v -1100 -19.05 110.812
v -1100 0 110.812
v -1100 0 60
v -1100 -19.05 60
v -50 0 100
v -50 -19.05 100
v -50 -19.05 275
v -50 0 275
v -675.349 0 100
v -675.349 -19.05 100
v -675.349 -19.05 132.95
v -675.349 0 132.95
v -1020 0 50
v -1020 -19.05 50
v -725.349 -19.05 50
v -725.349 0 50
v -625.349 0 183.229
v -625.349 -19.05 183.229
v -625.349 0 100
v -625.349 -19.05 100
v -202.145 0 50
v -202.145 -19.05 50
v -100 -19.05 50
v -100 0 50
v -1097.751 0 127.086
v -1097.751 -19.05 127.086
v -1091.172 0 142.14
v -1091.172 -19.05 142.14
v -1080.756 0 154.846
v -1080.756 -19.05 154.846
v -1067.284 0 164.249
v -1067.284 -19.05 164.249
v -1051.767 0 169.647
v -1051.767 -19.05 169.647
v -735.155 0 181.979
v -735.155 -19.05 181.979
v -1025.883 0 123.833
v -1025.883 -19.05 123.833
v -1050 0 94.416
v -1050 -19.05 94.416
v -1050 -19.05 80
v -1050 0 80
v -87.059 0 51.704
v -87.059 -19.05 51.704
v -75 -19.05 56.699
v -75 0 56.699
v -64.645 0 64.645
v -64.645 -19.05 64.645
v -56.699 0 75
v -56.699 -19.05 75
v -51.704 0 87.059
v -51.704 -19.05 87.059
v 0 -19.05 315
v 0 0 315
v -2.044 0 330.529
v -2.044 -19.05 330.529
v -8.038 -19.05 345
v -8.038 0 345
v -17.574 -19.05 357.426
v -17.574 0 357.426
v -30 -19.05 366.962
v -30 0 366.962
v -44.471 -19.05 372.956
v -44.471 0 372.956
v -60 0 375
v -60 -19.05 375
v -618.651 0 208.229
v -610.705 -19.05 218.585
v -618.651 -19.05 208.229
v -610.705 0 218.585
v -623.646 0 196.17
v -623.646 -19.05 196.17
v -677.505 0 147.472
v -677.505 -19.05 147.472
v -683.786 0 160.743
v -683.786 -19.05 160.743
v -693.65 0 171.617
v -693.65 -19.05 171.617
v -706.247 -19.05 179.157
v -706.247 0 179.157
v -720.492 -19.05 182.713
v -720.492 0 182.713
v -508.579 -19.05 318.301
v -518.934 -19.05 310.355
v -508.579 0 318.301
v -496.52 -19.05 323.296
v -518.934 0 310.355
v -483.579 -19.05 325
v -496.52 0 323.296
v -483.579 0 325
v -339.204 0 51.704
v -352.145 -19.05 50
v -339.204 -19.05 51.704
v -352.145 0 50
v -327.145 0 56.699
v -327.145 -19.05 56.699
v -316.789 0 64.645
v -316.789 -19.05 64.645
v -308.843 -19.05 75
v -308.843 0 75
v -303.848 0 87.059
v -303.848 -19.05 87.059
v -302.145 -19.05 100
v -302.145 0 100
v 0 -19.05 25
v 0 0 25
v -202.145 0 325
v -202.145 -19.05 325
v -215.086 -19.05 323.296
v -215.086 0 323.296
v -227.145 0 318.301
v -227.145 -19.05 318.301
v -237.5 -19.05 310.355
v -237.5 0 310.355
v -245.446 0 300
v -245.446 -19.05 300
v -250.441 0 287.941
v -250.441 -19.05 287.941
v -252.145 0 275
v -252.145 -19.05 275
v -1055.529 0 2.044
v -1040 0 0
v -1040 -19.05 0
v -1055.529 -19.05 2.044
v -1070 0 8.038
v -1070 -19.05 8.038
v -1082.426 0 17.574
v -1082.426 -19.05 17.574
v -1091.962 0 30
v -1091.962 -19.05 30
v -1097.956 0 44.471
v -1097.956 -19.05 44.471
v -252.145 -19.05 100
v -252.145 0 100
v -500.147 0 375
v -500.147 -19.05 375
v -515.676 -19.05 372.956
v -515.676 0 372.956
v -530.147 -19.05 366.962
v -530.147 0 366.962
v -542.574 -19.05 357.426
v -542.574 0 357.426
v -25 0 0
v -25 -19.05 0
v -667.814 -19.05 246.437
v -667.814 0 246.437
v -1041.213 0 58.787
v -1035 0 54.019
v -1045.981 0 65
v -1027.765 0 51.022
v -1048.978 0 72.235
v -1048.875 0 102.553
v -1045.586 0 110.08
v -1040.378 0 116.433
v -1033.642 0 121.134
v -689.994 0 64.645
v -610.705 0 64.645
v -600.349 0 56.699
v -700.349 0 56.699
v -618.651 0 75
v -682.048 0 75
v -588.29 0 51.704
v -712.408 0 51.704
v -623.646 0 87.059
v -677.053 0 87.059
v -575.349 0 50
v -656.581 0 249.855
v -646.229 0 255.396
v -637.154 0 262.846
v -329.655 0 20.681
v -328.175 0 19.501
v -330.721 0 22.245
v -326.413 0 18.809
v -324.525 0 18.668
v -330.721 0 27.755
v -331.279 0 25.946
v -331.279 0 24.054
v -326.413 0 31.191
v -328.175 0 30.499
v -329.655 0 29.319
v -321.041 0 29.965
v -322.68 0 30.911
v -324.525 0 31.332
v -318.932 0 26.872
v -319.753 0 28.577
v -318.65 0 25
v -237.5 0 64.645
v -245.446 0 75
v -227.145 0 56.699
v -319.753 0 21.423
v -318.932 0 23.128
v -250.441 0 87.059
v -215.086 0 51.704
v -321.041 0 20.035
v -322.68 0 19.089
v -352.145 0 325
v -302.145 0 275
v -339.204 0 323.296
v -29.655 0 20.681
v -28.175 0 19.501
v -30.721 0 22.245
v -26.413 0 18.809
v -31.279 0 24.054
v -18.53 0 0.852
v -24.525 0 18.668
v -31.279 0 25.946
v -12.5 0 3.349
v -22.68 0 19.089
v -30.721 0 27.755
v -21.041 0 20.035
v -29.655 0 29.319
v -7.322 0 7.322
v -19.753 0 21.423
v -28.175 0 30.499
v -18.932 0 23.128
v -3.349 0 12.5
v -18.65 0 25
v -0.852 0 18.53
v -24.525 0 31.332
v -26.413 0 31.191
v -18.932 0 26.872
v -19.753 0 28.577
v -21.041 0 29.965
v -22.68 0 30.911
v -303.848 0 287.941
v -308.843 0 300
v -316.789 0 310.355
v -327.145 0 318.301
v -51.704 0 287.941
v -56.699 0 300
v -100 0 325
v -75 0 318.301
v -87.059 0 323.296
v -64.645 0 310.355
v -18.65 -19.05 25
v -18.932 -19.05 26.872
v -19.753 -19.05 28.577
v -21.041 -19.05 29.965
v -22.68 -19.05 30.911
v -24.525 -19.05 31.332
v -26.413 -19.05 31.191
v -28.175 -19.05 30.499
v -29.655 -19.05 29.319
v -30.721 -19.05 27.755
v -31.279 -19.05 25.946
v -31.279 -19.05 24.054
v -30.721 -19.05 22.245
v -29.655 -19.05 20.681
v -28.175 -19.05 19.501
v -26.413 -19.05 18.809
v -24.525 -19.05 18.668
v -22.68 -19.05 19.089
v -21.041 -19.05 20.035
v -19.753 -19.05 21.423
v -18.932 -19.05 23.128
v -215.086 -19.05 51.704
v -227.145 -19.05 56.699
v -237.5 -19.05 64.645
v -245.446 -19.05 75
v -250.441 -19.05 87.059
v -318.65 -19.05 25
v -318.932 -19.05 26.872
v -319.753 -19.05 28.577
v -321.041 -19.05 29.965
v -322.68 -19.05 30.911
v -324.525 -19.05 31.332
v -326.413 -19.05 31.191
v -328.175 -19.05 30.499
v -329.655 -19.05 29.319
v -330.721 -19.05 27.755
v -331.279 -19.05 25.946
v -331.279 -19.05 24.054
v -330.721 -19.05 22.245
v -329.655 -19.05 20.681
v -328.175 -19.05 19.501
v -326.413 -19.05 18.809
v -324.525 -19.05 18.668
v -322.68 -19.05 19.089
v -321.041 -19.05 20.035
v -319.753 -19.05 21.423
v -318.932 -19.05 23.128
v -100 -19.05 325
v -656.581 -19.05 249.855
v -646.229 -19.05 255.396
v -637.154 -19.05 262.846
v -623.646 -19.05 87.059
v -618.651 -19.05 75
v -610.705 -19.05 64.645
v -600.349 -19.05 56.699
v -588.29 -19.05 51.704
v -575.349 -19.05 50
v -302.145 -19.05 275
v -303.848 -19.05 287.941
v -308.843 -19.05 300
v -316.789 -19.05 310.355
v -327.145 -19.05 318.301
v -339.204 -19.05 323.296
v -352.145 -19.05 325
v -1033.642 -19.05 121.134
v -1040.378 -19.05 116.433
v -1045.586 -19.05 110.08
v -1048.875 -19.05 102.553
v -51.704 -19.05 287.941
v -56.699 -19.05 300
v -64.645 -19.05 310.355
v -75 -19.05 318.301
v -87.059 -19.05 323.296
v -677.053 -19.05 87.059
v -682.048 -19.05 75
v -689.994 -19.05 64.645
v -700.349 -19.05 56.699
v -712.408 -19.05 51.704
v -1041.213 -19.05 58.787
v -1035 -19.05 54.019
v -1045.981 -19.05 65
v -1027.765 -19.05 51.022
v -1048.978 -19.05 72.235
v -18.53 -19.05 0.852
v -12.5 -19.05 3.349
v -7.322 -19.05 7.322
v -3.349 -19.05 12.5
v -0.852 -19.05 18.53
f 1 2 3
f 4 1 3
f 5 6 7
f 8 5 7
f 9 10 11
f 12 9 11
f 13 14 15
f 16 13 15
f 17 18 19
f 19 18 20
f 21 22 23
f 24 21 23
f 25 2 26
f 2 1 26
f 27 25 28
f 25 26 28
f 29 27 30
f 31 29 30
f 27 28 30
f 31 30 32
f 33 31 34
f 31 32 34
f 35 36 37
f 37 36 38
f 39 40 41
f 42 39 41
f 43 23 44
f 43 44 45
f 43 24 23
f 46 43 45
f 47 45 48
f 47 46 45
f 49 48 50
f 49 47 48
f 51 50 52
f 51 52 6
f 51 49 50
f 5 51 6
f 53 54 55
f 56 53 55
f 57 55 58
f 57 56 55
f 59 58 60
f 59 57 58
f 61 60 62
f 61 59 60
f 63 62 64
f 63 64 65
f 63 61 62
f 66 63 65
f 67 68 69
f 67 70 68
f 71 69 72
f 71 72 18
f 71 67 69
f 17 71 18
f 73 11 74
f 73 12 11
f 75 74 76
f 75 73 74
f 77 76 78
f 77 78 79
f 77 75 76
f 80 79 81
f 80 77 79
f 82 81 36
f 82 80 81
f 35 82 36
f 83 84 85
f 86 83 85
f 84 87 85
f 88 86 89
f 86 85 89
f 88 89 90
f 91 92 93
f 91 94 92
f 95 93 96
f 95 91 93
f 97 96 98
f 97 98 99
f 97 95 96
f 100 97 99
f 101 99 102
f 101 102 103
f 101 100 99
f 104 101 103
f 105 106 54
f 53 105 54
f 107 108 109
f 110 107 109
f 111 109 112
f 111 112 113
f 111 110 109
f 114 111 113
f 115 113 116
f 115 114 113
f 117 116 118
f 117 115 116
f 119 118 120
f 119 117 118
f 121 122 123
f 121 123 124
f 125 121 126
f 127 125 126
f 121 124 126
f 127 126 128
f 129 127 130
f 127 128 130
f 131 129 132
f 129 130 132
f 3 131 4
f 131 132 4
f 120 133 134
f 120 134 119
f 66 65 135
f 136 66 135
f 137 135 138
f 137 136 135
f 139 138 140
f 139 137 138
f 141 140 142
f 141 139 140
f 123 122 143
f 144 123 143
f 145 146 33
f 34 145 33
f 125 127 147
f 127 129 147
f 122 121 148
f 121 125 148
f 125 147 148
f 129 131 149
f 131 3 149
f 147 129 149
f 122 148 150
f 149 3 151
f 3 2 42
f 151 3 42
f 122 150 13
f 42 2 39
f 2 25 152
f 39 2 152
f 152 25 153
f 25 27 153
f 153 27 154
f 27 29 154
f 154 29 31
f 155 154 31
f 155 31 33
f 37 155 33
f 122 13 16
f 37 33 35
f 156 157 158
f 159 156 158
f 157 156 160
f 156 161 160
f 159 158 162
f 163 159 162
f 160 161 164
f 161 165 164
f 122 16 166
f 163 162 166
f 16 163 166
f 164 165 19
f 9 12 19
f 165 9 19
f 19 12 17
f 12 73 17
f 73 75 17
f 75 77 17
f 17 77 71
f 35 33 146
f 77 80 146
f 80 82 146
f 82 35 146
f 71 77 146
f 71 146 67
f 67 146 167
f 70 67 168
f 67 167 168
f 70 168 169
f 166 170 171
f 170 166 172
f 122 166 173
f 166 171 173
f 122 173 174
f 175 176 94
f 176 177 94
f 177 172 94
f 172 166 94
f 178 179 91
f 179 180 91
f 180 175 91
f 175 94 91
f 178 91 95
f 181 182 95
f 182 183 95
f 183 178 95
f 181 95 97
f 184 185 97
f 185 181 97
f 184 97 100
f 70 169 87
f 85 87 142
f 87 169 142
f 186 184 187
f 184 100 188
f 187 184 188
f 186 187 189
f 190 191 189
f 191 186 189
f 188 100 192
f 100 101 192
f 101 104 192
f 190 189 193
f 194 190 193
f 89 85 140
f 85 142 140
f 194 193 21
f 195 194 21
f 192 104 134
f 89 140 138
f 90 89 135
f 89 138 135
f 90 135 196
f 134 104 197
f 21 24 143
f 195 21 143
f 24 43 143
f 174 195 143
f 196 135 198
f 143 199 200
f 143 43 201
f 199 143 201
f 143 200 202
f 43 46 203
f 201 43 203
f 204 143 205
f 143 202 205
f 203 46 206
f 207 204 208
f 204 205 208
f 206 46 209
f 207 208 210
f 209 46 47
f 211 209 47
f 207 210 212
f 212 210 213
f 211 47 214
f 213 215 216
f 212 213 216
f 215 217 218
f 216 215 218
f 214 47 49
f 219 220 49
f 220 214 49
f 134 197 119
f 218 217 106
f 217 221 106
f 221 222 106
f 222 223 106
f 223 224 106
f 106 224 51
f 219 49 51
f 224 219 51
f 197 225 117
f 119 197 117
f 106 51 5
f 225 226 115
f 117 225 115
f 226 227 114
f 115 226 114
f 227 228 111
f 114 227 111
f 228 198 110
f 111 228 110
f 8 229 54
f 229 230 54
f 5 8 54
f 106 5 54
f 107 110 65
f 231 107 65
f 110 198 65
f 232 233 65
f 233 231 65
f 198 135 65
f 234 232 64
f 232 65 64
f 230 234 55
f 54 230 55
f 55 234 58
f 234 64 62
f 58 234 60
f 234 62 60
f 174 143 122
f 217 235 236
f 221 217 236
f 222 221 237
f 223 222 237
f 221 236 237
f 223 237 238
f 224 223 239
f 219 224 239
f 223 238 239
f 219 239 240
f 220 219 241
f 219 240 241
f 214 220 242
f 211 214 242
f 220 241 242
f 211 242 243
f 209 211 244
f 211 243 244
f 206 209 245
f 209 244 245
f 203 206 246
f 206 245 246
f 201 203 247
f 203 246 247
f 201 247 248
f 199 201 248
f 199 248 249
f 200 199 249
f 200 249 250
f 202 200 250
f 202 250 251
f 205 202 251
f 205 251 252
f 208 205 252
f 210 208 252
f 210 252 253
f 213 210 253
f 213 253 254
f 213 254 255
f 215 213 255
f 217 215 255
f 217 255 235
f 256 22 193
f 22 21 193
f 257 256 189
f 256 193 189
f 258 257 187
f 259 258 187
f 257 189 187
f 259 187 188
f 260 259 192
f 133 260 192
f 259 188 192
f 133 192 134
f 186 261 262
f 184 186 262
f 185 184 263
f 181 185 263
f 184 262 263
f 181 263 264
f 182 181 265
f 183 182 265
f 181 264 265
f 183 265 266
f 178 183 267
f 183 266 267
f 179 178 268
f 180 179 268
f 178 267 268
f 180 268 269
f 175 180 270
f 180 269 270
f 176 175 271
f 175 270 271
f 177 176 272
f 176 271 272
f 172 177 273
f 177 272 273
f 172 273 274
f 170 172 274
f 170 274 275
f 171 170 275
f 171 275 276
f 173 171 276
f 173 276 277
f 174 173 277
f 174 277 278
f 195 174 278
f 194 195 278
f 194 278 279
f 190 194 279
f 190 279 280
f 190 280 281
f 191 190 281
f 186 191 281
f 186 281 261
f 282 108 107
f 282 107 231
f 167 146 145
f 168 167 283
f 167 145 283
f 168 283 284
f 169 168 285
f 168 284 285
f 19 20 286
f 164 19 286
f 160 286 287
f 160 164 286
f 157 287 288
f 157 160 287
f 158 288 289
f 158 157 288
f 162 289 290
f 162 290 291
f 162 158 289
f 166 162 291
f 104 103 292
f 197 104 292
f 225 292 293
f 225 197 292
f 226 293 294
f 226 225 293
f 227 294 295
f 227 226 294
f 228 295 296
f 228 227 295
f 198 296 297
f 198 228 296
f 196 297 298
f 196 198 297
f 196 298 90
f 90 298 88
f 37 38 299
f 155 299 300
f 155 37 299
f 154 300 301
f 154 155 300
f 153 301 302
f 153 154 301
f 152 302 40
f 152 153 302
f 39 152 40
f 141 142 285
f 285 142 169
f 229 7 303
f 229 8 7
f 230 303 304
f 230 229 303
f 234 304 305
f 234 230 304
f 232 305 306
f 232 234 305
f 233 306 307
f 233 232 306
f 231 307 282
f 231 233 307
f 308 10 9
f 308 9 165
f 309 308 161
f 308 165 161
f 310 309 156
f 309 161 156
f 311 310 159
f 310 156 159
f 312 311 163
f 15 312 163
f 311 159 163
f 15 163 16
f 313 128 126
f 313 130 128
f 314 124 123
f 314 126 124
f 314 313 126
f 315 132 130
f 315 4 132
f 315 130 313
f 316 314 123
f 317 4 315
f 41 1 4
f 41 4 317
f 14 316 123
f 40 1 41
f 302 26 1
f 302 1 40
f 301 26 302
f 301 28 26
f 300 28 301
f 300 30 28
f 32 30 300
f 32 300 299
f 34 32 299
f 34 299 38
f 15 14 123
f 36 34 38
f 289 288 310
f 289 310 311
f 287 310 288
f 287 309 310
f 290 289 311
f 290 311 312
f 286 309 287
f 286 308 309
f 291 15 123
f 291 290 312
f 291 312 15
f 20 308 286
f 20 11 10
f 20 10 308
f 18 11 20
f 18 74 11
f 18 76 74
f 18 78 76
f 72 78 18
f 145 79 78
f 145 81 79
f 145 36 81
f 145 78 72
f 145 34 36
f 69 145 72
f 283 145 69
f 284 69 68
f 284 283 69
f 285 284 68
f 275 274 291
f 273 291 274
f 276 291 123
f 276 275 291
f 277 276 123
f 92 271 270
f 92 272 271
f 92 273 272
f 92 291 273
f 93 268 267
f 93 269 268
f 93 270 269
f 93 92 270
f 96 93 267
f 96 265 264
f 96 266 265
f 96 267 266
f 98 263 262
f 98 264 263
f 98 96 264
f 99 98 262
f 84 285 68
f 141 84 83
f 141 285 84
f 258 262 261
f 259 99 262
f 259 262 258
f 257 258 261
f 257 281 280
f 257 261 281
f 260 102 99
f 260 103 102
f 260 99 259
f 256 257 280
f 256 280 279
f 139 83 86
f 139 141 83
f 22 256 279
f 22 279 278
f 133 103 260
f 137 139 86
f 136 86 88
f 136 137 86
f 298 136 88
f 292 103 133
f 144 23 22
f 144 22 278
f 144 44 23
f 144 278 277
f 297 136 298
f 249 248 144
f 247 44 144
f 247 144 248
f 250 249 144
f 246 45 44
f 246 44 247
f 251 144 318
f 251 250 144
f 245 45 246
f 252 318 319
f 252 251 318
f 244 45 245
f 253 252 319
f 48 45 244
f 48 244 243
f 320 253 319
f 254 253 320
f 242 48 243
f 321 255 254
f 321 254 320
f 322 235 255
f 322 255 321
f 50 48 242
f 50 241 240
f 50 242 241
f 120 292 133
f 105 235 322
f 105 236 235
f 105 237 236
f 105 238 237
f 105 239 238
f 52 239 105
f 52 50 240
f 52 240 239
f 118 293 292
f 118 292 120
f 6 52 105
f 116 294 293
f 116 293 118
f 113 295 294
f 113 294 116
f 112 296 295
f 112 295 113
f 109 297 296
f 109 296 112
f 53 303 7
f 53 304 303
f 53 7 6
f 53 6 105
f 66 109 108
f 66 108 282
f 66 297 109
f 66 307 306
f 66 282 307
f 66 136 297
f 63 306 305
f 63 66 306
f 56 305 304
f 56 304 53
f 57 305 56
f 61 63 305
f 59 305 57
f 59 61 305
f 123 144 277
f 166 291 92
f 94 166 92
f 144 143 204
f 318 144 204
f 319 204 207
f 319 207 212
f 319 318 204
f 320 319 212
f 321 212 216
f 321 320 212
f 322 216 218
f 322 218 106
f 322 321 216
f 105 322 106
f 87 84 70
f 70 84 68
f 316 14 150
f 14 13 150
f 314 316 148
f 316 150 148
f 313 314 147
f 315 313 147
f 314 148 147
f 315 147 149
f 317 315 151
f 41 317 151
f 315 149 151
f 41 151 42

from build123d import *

# Parameters (mm, degrees)
F1_DEPTH = 19.05
F2_R     = 6.35
F3_DEPTH = 25
F4_R     = 6.35
F5_DEPTH = 25
F6_DEPTH = 25
F7_W     = 202.144652
F7_H     = 274.999976
F8_DEPTH = 25
F9_R     = 50
F10_R    = 60
F11_R    = 25
F12_R    = 30


with BuildPart() as f1:
    # F0 (on Front) → F1 (new body)
    with BuildSketch(Plane.XZ):
        Polygon((-1100, 0), (0, 0), (0, 375), (-525, 375), (-650, 250), (-1100, 160), align=None)
    extrude(amount=F1_DEPTH)

    # F2 (on face) → F3 (cut)
    with BuildSketch(Plane.XZ.offset(19.05)):
        with Locations((-325, 25)):
            Circle(F2_R)
    extrude(amount=-F3_DEPTH, mode=Mode.SUBTRACT)

    # F4 (on face) → F5 (cut)
    with BuildSketch(Plane.XZ.offset(19.05)):
        with Locations((-25, 25)):
            Circle(F4_R)
    extrude(amount=-F5_DEPTH, mode=Mode.SUBTRACT)

    # F4 (on face) → F6 (cut)
    with BuildSketch(Plane.XZ.offset(19.05)):
        with Locations((-25, 25)):
            Circle(F4_R)
    extrude(amount=F6_DEPTH, mode=Mode.SUBTRACT)

    # F7 (on face) → F8 (cut)
    with BuildSketch(Plane.XZ.offset(19.05)):
        Polygon((-675.34939, 50.000012), (-675.34939, 193.939915), (-1049.999988, 119.009795), (-1049.999988, 50.000012), align=None)
        Polygon((-504.289317, 324.999988), (-625.34939, 203.939915), (-625.34939, 50.000012), (-302.144664, 50.000012), (-302.144664, 324.999988), align=None)
        with Locations((-151.072338, 187.5)):
            Rectangle(F7_W, F7_H)
    extrude(amount=-F8_DEPTH, mode=Mode.SUBTRACT)

    # F9
    f9_edges = [f1.edges().sort_by_distance(p)[0] for p in [
        (-675.34939, -9.525, 50.000012),
        (-675.34939, -9.525, 193.939915),
        (-625.34939, -9.525, 203.939915),
        (-625.34939, -9.525, 50.000012),
        (-504.289317, -9.525, 324.999988),
        (-302.144664, -9.525, 324.999988),
        (-302.144664, -9.525, 50.000012),
        (-50.000012, -9.525, 50.000012),
        (-252.144664, -9.525, 50.000012),
        (-252.144664, -9.525, 324.999988),
        (-50.000012, -9.525, 324.999988),
    ]]
    fillet(f9_edges, radius=F9_R)

    # F10
    f10_edges = [f1.edges().sort_by_distance(p)[0] for p in [
        (-650, -9.525, 250),
        (-525, -9.525, 375),
        (0, -9.525, 375),
        (-1100, -9.525, 160),
        (-1100, -9.525, 0),
    ]]
    fillet(f10_edges, radius=F10_R)

    # F11
    f11_edges = [f1.edges().sort_by_distance(p)[0] for p in [
        (0, -9.525, 0),
    ]]
    fillet(f11_edges, radius=F11_R)

    # F12
    f12_edges = [f1.edges().sort_by_distance(p)[0] for p in [
        (-1049.999988, -9.525, 119.009795),
        (-1049.999988, -9.525, 50.000012),
    ]]
    fillet(f12_edges, radius=F12_R)


solid = f1.part
